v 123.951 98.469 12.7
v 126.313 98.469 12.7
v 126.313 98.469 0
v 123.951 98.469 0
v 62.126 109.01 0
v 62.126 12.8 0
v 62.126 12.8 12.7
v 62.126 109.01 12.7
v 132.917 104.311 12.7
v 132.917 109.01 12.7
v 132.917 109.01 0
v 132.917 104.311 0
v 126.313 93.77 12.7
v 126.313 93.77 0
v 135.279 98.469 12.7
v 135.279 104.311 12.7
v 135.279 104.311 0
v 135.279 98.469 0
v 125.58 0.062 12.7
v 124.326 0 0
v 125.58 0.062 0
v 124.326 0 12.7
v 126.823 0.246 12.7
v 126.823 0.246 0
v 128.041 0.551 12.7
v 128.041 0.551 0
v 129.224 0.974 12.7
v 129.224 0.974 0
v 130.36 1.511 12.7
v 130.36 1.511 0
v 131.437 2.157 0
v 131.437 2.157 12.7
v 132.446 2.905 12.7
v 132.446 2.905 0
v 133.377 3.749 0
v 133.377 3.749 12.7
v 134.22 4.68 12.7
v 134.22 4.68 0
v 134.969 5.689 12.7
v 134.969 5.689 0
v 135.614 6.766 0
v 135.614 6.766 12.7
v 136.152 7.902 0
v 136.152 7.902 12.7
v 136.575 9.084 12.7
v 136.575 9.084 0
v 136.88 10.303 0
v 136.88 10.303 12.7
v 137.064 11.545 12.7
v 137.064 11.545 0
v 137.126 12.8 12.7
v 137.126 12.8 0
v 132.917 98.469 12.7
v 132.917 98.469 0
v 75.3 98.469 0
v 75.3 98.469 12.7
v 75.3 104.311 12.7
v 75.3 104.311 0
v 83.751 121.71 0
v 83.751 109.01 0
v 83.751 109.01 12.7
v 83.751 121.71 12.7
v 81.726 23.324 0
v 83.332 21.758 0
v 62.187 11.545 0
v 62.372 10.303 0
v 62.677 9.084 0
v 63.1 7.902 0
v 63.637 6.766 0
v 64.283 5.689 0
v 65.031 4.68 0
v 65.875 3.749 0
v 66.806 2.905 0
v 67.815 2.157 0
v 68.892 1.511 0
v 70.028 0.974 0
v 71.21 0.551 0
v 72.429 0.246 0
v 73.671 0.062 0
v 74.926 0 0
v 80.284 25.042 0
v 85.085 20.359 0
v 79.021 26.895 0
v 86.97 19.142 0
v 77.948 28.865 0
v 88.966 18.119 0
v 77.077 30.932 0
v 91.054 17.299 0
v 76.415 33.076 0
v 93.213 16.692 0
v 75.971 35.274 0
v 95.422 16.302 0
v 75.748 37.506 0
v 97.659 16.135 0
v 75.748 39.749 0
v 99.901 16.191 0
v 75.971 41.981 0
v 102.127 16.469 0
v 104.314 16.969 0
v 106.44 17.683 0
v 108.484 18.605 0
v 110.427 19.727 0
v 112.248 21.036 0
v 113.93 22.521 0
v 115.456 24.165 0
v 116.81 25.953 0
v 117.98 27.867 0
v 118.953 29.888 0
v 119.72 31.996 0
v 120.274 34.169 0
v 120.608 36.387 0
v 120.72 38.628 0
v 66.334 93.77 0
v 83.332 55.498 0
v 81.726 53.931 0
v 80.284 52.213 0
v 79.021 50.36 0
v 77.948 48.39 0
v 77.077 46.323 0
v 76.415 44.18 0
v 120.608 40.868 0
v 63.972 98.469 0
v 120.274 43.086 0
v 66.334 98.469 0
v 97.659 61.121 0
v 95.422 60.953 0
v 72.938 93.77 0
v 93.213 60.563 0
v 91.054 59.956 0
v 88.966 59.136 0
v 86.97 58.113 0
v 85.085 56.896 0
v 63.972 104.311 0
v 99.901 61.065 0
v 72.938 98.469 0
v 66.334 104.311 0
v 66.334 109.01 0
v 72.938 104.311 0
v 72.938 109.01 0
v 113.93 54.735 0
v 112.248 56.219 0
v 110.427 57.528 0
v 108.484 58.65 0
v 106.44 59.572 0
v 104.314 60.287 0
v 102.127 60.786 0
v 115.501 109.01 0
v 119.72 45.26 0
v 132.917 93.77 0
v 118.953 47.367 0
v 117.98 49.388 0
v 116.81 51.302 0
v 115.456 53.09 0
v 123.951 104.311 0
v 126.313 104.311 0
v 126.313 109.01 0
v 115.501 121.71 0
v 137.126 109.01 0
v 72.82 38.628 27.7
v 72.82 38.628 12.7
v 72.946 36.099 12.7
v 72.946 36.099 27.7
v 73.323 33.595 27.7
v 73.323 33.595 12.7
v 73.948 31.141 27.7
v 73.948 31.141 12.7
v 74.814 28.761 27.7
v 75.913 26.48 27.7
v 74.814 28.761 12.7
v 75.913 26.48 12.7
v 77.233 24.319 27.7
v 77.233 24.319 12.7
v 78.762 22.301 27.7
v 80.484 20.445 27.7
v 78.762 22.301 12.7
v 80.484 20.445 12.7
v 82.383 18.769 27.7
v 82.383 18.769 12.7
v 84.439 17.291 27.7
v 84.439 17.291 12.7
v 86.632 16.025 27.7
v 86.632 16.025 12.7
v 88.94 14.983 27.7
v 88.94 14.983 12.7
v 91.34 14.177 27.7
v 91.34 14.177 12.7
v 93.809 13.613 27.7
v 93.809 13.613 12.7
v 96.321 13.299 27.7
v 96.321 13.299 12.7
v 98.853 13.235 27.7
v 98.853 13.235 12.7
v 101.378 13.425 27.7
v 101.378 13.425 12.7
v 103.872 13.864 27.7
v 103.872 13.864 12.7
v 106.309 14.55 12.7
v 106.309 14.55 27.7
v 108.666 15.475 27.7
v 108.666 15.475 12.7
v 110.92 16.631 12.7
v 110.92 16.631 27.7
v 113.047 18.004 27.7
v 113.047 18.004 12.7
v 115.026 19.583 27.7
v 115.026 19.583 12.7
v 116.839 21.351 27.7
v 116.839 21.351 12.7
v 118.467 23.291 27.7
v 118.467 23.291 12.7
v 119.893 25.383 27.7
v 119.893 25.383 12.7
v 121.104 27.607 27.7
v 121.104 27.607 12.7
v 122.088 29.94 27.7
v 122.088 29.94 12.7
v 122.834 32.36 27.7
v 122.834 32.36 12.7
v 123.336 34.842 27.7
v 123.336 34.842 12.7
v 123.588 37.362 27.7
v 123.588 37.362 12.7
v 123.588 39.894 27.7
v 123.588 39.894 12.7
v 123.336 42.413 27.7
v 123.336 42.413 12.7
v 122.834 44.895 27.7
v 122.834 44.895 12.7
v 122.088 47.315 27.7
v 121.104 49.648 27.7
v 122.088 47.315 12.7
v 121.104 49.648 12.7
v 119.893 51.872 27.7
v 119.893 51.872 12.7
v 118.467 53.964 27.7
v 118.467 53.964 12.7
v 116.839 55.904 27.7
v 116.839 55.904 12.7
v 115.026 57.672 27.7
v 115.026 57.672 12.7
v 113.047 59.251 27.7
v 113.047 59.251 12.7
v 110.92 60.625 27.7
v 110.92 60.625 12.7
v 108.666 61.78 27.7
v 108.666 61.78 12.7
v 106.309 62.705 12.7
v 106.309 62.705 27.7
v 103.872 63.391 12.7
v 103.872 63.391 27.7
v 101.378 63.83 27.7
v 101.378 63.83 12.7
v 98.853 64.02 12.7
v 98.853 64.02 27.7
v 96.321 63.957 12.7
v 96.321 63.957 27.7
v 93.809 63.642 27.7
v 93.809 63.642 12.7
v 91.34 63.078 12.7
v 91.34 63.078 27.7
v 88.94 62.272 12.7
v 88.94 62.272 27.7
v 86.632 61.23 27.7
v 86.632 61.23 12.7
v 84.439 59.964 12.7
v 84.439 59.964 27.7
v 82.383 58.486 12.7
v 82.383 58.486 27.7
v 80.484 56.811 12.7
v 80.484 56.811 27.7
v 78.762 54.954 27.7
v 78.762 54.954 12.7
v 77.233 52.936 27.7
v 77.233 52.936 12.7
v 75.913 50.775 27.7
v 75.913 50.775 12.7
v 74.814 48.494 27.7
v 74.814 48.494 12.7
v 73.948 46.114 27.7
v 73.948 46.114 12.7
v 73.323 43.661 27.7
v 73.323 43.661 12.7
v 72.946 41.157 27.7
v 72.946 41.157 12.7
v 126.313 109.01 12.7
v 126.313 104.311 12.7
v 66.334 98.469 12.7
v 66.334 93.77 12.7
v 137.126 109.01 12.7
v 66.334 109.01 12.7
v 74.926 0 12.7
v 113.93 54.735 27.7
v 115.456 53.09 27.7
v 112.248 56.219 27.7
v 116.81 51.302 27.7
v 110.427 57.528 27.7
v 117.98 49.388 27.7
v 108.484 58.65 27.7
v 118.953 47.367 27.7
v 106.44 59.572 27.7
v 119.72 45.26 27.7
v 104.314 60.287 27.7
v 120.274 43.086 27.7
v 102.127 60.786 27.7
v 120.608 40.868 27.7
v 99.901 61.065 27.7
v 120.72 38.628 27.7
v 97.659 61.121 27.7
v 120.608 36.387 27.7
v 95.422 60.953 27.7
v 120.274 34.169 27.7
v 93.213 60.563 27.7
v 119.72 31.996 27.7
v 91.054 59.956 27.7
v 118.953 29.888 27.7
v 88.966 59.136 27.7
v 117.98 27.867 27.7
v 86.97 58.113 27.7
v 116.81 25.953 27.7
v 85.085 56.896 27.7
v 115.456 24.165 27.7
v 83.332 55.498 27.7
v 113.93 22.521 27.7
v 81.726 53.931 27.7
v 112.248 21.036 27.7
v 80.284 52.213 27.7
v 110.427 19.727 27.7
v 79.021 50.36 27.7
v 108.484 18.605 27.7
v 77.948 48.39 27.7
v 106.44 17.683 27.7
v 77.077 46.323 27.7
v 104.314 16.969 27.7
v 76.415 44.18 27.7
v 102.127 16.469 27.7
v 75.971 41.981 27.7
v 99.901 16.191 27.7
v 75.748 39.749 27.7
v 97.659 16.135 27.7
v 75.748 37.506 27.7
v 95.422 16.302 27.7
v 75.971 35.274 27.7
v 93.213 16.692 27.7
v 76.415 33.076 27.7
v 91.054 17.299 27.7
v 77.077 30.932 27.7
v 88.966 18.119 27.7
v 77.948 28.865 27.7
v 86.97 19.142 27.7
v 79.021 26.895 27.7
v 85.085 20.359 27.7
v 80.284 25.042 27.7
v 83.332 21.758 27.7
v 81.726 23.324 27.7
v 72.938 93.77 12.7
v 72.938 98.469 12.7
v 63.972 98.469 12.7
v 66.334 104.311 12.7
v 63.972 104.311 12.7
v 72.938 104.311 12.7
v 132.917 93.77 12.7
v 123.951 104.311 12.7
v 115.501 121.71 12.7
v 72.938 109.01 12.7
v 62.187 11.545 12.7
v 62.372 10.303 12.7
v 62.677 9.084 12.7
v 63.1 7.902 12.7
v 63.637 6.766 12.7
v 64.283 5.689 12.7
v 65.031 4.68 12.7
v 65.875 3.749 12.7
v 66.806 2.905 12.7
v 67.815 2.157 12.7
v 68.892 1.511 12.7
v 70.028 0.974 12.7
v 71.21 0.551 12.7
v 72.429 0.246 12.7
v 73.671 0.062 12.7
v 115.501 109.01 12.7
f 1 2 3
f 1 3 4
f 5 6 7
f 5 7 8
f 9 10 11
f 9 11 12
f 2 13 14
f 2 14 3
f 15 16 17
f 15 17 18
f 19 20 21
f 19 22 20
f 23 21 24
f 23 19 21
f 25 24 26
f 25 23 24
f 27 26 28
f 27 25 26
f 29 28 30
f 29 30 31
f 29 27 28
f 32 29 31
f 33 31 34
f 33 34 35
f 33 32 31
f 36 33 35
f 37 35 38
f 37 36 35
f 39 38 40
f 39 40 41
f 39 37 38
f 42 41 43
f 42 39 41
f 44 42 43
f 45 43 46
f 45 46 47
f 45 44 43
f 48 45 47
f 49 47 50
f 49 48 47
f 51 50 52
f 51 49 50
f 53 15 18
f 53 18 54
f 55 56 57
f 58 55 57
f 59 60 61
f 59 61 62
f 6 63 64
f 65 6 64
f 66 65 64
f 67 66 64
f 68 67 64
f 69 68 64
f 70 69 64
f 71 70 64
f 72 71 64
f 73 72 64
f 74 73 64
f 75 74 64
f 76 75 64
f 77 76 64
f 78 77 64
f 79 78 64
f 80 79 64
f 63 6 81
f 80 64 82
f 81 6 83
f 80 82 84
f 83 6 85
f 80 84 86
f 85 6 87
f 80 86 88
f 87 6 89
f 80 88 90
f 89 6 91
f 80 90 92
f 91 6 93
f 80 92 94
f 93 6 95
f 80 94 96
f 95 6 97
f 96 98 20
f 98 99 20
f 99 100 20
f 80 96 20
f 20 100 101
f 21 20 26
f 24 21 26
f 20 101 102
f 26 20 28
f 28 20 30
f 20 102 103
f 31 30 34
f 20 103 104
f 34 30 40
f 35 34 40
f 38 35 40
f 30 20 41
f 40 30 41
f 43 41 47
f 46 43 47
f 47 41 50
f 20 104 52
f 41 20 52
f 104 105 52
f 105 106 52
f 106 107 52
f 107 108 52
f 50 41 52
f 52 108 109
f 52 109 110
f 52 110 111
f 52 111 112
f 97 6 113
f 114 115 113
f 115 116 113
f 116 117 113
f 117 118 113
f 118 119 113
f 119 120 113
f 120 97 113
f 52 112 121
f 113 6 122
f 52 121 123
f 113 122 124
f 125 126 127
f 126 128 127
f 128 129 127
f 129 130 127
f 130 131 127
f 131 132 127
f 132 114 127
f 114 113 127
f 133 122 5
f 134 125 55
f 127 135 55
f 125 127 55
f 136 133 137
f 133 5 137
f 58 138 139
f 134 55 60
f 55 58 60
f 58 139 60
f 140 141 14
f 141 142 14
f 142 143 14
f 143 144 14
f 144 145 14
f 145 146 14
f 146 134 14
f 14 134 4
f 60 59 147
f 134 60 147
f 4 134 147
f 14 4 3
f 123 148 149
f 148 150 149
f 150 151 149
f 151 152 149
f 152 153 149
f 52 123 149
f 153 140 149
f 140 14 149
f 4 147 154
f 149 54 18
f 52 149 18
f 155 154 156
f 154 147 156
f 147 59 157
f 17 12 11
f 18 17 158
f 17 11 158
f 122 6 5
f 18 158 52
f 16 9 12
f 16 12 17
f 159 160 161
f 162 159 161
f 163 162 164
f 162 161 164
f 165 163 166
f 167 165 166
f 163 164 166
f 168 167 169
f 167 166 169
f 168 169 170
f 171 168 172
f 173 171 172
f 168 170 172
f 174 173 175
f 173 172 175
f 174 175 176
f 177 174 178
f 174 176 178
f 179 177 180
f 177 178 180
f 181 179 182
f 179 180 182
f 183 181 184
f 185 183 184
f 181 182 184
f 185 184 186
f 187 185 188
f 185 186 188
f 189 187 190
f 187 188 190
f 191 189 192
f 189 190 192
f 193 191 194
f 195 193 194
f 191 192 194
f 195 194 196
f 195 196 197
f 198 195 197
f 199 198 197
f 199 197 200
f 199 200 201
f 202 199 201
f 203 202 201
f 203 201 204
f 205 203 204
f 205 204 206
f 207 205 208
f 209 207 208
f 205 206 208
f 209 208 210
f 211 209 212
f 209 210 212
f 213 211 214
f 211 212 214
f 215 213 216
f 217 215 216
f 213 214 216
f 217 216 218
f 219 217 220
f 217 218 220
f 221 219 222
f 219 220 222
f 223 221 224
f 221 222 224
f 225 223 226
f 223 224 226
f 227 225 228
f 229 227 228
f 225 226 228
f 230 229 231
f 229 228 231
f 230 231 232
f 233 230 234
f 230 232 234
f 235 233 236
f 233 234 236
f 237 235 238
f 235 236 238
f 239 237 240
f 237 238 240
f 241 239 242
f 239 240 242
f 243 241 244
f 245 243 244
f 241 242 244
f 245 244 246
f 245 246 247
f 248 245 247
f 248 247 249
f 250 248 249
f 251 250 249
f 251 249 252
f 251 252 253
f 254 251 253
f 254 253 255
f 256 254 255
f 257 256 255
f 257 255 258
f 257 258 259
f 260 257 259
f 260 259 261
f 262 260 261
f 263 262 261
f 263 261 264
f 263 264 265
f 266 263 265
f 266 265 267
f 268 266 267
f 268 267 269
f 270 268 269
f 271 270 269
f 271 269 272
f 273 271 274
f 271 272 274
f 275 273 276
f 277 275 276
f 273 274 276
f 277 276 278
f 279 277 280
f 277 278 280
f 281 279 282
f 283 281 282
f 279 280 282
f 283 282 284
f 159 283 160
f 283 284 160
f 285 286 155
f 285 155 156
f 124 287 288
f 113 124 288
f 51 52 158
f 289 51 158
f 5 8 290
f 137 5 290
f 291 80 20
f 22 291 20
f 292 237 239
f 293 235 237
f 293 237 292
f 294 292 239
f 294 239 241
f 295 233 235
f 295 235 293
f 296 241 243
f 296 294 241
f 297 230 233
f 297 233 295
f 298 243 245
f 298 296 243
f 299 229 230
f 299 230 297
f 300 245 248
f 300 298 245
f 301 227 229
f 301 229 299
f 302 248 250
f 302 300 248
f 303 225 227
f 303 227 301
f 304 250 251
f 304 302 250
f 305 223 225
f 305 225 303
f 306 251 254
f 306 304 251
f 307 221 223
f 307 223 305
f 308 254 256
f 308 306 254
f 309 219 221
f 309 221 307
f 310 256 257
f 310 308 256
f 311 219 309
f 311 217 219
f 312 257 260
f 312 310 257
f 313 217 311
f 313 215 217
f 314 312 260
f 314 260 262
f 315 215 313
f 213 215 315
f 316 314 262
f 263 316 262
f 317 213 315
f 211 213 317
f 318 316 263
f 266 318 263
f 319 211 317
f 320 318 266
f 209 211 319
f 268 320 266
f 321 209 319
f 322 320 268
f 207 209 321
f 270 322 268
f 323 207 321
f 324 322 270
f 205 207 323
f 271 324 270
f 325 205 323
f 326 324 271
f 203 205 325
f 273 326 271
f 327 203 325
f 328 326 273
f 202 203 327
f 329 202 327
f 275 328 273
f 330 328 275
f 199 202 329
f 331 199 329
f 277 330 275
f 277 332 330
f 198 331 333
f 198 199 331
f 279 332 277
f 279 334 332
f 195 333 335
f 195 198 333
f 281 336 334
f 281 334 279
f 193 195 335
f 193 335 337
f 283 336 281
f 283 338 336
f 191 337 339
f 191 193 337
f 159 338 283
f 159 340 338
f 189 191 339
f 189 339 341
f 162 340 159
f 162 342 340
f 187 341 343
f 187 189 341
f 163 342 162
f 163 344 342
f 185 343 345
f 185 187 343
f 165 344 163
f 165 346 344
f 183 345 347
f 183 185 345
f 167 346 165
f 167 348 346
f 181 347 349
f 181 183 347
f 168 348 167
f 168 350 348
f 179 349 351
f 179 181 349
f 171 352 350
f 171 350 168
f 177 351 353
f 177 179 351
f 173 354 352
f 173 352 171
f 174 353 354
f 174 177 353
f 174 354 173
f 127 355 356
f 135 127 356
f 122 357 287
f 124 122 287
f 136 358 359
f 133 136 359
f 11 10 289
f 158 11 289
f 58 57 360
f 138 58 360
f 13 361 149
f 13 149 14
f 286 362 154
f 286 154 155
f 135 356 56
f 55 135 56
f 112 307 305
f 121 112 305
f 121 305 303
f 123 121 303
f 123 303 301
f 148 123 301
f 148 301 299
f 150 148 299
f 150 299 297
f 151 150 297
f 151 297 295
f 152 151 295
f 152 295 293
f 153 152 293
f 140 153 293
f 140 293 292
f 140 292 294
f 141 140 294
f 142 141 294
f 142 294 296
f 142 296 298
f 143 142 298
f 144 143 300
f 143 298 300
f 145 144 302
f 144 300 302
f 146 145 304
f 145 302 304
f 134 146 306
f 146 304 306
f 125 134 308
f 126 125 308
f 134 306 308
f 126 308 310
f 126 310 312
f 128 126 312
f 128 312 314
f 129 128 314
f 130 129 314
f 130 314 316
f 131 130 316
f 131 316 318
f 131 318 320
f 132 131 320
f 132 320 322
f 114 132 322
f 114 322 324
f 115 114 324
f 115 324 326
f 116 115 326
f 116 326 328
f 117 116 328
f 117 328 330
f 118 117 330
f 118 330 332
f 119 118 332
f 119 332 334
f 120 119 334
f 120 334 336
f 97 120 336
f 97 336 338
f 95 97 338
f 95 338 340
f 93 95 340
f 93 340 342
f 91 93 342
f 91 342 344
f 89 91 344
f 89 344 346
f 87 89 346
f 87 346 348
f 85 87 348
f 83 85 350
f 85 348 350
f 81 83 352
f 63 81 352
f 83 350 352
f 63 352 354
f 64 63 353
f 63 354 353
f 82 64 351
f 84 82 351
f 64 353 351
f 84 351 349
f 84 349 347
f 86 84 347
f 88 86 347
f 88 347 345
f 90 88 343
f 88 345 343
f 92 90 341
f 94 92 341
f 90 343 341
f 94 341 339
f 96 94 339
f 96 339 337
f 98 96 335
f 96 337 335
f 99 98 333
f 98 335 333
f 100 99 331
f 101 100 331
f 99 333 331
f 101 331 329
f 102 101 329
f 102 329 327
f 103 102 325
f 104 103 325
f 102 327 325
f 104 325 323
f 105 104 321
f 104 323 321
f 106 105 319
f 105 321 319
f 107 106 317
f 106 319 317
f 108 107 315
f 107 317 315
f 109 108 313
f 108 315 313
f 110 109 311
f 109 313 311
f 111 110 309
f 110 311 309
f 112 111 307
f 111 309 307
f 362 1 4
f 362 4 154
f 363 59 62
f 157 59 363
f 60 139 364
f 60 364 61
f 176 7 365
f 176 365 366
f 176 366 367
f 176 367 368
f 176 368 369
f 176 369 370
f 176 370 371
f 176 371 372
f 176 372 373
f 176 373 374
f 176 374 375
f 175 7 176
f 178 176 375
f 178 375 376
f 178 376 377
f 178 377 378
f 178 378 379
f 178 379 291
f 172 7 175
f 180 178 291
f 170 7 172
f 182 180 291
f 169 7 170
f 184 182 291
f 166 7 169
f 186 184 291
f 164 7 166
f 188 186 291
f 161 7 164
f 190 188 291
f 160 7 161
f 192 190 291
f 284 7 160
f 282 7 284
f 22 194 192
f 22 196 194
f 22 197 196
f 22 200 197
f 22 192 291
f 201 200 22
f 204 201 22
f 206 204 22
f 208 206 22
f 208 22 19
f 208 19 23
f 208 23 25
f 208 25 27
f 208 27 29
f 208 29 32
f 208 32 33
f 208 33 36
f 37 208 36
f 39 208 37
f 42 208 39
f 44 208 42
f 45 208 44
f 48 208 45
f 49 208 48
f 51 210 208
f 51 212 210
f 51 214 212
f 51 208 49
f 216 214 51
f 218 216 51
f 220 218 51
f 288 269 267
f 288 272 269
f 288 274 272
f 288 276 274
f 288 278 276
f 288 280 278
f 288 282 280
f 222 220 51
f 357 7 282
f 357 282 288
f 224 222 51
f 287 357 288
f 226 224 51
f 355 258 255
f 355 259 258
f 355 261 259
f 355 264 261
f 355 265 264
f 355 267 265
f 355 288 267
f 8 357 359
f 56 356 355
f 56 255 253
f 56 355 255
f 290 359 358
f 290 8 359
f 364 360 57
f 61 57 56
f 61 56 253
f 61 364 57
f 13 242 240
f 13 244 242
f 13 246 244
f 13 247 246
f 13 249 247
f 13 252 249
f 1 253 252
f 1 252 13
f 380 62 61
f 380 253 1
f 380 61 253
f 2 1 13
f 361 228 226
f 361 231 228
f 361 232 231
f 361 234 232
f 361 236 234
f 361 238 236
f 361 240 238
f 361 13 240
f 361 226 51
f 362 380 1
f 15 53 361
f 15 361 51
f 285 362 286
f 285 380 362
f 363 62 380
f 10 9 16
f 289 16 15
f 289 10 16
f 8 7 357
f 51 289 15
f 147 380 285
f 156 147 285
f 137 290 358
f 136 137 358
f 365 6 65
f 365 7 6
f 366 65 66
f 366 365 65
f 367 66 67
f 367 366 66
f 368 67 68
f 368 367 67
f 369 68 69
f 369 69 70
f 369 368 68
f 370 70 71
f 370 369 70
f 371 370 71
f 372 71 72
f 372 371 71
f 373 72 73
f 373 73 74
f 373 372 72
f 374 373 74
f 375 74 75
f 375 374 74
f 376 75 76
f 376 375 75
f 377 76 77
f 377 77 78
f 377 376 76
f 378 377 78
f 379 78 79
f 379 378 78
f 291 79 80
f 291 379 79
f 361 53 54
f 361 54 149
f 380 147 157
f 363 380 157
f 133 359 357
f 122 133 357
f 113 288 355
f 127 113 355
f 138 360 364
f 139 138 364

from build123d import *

# Parameters (mm, degrees)
SKETCH12_W           = 75
SKETCH12_H           = 121.71
BOSS_EXTRUDE10_DEPTH = 12.7
SKETCH15_R           = 25.4
BOSS_EXTRUDE11_DEPTH = 15
SKETCH23_R           = 22.5
CUT_EXTRUDE7_DEPTH   = 186.429535576
FILLET2_R            = 12.8
SKETCH25_W           = 21.625
SKETCH25_H           = 12.7
CUT_EXTRUDE9_DEPTH   = 184.961470596
CUT_EXTRUDE10_DEPTH  = 184.961470596


with BuildPart() as part:
    # Sketch12 → Boss-Extrude10 (new body)
    with BuildSketch(Plane.XY):
        with Locations((99.625849364, 60.855)):
            Rectangle(SKETCH12_W, SKETCH12_H)
    extrude(amount=BOSS_EXTRUDE10_DEPTH)

    # Sketch15 → Boss-Extrude11 (add)
    with BuildSketch(Plane.XY.offset(12.7)):
        with Locations(Location((98.219620603, 38.627603634, 0), (0, 0, 180))):
            Circle(SKETCH15_R)
    extrude(amount=BOSS_EXTRUDE11_DEPTH)

    # Sketch23 → Cut-Extrude7 (cut, through all)
    with BuildSketch(Plane.XY.offset(27.7)):
        with Locations((98.219620603, 38.627603634)):
            Circle(SKETCH23_R)
    extrude(amount=-CUT_EXTRUDE7_DEPTH, mode=Mode.SUBTRACT)

    # Fillet2
    fillet2_edges = [part.edges().sort_by_distance(p)[0] for p in [
        (62.125849364, 0, 6.35),
        (137.125849364, 0, 6.35),
    ]]
    fillet(fillet2_edges, radius=FILLET2_R)

    # Sketch25 → Cut-Extrude9 (cut, through all)
    with BuildSketch(Plane.XY.offset(12.7)):
        with Locations((72.938349364, 115.36)):
            Rectangle(SKETCH25_W, SKETCH25_H)
        with Locations((126.313349364, 115.36)):
            Rectangle(SKETCH25_W, SKETCH25_H)
    extrude(amount=-CUT_EXTRUDE9_DEPTH, mode=Mode.SUBTRACT)

    # Sketch27 → Cut-Extrude10 (cut, through all)
    with BuildSketch(Plane.XY.offset(12.7)):
        Polygon((132.917349364, 109.01), (132.917349364, 104.311), (135.279349364, 104.311), (135.279349364, 98.469), (132.917349364, 98.469), (132.917349364, 93.77), (126.313349364, 93.77), (126.313349364, 98.469), (123.951349364, 98.469), (123.951349364, 104.311), (126.313349364, 104.311), (126.313349364, 109.01), align=None)
        Polygon((72.938349364, 98.469), (75.300349364, 98.469), (75.300349364, 104.311), (72.938349364, 104.311), (72.938349364, 109.01), (66.334349364, 109.01), (66.334349364, 104.311), (63.972349364, 104.311), (63.972349364, 98.469), (66.334349364, 98.469), (66.334349364, 93.77), (72.938349364, 93.77), align=None)
    extrude(amount=-CUT_EXTRUDE10_DEPTH, mode=Mode.SUBTRACT)


solid = part.part
